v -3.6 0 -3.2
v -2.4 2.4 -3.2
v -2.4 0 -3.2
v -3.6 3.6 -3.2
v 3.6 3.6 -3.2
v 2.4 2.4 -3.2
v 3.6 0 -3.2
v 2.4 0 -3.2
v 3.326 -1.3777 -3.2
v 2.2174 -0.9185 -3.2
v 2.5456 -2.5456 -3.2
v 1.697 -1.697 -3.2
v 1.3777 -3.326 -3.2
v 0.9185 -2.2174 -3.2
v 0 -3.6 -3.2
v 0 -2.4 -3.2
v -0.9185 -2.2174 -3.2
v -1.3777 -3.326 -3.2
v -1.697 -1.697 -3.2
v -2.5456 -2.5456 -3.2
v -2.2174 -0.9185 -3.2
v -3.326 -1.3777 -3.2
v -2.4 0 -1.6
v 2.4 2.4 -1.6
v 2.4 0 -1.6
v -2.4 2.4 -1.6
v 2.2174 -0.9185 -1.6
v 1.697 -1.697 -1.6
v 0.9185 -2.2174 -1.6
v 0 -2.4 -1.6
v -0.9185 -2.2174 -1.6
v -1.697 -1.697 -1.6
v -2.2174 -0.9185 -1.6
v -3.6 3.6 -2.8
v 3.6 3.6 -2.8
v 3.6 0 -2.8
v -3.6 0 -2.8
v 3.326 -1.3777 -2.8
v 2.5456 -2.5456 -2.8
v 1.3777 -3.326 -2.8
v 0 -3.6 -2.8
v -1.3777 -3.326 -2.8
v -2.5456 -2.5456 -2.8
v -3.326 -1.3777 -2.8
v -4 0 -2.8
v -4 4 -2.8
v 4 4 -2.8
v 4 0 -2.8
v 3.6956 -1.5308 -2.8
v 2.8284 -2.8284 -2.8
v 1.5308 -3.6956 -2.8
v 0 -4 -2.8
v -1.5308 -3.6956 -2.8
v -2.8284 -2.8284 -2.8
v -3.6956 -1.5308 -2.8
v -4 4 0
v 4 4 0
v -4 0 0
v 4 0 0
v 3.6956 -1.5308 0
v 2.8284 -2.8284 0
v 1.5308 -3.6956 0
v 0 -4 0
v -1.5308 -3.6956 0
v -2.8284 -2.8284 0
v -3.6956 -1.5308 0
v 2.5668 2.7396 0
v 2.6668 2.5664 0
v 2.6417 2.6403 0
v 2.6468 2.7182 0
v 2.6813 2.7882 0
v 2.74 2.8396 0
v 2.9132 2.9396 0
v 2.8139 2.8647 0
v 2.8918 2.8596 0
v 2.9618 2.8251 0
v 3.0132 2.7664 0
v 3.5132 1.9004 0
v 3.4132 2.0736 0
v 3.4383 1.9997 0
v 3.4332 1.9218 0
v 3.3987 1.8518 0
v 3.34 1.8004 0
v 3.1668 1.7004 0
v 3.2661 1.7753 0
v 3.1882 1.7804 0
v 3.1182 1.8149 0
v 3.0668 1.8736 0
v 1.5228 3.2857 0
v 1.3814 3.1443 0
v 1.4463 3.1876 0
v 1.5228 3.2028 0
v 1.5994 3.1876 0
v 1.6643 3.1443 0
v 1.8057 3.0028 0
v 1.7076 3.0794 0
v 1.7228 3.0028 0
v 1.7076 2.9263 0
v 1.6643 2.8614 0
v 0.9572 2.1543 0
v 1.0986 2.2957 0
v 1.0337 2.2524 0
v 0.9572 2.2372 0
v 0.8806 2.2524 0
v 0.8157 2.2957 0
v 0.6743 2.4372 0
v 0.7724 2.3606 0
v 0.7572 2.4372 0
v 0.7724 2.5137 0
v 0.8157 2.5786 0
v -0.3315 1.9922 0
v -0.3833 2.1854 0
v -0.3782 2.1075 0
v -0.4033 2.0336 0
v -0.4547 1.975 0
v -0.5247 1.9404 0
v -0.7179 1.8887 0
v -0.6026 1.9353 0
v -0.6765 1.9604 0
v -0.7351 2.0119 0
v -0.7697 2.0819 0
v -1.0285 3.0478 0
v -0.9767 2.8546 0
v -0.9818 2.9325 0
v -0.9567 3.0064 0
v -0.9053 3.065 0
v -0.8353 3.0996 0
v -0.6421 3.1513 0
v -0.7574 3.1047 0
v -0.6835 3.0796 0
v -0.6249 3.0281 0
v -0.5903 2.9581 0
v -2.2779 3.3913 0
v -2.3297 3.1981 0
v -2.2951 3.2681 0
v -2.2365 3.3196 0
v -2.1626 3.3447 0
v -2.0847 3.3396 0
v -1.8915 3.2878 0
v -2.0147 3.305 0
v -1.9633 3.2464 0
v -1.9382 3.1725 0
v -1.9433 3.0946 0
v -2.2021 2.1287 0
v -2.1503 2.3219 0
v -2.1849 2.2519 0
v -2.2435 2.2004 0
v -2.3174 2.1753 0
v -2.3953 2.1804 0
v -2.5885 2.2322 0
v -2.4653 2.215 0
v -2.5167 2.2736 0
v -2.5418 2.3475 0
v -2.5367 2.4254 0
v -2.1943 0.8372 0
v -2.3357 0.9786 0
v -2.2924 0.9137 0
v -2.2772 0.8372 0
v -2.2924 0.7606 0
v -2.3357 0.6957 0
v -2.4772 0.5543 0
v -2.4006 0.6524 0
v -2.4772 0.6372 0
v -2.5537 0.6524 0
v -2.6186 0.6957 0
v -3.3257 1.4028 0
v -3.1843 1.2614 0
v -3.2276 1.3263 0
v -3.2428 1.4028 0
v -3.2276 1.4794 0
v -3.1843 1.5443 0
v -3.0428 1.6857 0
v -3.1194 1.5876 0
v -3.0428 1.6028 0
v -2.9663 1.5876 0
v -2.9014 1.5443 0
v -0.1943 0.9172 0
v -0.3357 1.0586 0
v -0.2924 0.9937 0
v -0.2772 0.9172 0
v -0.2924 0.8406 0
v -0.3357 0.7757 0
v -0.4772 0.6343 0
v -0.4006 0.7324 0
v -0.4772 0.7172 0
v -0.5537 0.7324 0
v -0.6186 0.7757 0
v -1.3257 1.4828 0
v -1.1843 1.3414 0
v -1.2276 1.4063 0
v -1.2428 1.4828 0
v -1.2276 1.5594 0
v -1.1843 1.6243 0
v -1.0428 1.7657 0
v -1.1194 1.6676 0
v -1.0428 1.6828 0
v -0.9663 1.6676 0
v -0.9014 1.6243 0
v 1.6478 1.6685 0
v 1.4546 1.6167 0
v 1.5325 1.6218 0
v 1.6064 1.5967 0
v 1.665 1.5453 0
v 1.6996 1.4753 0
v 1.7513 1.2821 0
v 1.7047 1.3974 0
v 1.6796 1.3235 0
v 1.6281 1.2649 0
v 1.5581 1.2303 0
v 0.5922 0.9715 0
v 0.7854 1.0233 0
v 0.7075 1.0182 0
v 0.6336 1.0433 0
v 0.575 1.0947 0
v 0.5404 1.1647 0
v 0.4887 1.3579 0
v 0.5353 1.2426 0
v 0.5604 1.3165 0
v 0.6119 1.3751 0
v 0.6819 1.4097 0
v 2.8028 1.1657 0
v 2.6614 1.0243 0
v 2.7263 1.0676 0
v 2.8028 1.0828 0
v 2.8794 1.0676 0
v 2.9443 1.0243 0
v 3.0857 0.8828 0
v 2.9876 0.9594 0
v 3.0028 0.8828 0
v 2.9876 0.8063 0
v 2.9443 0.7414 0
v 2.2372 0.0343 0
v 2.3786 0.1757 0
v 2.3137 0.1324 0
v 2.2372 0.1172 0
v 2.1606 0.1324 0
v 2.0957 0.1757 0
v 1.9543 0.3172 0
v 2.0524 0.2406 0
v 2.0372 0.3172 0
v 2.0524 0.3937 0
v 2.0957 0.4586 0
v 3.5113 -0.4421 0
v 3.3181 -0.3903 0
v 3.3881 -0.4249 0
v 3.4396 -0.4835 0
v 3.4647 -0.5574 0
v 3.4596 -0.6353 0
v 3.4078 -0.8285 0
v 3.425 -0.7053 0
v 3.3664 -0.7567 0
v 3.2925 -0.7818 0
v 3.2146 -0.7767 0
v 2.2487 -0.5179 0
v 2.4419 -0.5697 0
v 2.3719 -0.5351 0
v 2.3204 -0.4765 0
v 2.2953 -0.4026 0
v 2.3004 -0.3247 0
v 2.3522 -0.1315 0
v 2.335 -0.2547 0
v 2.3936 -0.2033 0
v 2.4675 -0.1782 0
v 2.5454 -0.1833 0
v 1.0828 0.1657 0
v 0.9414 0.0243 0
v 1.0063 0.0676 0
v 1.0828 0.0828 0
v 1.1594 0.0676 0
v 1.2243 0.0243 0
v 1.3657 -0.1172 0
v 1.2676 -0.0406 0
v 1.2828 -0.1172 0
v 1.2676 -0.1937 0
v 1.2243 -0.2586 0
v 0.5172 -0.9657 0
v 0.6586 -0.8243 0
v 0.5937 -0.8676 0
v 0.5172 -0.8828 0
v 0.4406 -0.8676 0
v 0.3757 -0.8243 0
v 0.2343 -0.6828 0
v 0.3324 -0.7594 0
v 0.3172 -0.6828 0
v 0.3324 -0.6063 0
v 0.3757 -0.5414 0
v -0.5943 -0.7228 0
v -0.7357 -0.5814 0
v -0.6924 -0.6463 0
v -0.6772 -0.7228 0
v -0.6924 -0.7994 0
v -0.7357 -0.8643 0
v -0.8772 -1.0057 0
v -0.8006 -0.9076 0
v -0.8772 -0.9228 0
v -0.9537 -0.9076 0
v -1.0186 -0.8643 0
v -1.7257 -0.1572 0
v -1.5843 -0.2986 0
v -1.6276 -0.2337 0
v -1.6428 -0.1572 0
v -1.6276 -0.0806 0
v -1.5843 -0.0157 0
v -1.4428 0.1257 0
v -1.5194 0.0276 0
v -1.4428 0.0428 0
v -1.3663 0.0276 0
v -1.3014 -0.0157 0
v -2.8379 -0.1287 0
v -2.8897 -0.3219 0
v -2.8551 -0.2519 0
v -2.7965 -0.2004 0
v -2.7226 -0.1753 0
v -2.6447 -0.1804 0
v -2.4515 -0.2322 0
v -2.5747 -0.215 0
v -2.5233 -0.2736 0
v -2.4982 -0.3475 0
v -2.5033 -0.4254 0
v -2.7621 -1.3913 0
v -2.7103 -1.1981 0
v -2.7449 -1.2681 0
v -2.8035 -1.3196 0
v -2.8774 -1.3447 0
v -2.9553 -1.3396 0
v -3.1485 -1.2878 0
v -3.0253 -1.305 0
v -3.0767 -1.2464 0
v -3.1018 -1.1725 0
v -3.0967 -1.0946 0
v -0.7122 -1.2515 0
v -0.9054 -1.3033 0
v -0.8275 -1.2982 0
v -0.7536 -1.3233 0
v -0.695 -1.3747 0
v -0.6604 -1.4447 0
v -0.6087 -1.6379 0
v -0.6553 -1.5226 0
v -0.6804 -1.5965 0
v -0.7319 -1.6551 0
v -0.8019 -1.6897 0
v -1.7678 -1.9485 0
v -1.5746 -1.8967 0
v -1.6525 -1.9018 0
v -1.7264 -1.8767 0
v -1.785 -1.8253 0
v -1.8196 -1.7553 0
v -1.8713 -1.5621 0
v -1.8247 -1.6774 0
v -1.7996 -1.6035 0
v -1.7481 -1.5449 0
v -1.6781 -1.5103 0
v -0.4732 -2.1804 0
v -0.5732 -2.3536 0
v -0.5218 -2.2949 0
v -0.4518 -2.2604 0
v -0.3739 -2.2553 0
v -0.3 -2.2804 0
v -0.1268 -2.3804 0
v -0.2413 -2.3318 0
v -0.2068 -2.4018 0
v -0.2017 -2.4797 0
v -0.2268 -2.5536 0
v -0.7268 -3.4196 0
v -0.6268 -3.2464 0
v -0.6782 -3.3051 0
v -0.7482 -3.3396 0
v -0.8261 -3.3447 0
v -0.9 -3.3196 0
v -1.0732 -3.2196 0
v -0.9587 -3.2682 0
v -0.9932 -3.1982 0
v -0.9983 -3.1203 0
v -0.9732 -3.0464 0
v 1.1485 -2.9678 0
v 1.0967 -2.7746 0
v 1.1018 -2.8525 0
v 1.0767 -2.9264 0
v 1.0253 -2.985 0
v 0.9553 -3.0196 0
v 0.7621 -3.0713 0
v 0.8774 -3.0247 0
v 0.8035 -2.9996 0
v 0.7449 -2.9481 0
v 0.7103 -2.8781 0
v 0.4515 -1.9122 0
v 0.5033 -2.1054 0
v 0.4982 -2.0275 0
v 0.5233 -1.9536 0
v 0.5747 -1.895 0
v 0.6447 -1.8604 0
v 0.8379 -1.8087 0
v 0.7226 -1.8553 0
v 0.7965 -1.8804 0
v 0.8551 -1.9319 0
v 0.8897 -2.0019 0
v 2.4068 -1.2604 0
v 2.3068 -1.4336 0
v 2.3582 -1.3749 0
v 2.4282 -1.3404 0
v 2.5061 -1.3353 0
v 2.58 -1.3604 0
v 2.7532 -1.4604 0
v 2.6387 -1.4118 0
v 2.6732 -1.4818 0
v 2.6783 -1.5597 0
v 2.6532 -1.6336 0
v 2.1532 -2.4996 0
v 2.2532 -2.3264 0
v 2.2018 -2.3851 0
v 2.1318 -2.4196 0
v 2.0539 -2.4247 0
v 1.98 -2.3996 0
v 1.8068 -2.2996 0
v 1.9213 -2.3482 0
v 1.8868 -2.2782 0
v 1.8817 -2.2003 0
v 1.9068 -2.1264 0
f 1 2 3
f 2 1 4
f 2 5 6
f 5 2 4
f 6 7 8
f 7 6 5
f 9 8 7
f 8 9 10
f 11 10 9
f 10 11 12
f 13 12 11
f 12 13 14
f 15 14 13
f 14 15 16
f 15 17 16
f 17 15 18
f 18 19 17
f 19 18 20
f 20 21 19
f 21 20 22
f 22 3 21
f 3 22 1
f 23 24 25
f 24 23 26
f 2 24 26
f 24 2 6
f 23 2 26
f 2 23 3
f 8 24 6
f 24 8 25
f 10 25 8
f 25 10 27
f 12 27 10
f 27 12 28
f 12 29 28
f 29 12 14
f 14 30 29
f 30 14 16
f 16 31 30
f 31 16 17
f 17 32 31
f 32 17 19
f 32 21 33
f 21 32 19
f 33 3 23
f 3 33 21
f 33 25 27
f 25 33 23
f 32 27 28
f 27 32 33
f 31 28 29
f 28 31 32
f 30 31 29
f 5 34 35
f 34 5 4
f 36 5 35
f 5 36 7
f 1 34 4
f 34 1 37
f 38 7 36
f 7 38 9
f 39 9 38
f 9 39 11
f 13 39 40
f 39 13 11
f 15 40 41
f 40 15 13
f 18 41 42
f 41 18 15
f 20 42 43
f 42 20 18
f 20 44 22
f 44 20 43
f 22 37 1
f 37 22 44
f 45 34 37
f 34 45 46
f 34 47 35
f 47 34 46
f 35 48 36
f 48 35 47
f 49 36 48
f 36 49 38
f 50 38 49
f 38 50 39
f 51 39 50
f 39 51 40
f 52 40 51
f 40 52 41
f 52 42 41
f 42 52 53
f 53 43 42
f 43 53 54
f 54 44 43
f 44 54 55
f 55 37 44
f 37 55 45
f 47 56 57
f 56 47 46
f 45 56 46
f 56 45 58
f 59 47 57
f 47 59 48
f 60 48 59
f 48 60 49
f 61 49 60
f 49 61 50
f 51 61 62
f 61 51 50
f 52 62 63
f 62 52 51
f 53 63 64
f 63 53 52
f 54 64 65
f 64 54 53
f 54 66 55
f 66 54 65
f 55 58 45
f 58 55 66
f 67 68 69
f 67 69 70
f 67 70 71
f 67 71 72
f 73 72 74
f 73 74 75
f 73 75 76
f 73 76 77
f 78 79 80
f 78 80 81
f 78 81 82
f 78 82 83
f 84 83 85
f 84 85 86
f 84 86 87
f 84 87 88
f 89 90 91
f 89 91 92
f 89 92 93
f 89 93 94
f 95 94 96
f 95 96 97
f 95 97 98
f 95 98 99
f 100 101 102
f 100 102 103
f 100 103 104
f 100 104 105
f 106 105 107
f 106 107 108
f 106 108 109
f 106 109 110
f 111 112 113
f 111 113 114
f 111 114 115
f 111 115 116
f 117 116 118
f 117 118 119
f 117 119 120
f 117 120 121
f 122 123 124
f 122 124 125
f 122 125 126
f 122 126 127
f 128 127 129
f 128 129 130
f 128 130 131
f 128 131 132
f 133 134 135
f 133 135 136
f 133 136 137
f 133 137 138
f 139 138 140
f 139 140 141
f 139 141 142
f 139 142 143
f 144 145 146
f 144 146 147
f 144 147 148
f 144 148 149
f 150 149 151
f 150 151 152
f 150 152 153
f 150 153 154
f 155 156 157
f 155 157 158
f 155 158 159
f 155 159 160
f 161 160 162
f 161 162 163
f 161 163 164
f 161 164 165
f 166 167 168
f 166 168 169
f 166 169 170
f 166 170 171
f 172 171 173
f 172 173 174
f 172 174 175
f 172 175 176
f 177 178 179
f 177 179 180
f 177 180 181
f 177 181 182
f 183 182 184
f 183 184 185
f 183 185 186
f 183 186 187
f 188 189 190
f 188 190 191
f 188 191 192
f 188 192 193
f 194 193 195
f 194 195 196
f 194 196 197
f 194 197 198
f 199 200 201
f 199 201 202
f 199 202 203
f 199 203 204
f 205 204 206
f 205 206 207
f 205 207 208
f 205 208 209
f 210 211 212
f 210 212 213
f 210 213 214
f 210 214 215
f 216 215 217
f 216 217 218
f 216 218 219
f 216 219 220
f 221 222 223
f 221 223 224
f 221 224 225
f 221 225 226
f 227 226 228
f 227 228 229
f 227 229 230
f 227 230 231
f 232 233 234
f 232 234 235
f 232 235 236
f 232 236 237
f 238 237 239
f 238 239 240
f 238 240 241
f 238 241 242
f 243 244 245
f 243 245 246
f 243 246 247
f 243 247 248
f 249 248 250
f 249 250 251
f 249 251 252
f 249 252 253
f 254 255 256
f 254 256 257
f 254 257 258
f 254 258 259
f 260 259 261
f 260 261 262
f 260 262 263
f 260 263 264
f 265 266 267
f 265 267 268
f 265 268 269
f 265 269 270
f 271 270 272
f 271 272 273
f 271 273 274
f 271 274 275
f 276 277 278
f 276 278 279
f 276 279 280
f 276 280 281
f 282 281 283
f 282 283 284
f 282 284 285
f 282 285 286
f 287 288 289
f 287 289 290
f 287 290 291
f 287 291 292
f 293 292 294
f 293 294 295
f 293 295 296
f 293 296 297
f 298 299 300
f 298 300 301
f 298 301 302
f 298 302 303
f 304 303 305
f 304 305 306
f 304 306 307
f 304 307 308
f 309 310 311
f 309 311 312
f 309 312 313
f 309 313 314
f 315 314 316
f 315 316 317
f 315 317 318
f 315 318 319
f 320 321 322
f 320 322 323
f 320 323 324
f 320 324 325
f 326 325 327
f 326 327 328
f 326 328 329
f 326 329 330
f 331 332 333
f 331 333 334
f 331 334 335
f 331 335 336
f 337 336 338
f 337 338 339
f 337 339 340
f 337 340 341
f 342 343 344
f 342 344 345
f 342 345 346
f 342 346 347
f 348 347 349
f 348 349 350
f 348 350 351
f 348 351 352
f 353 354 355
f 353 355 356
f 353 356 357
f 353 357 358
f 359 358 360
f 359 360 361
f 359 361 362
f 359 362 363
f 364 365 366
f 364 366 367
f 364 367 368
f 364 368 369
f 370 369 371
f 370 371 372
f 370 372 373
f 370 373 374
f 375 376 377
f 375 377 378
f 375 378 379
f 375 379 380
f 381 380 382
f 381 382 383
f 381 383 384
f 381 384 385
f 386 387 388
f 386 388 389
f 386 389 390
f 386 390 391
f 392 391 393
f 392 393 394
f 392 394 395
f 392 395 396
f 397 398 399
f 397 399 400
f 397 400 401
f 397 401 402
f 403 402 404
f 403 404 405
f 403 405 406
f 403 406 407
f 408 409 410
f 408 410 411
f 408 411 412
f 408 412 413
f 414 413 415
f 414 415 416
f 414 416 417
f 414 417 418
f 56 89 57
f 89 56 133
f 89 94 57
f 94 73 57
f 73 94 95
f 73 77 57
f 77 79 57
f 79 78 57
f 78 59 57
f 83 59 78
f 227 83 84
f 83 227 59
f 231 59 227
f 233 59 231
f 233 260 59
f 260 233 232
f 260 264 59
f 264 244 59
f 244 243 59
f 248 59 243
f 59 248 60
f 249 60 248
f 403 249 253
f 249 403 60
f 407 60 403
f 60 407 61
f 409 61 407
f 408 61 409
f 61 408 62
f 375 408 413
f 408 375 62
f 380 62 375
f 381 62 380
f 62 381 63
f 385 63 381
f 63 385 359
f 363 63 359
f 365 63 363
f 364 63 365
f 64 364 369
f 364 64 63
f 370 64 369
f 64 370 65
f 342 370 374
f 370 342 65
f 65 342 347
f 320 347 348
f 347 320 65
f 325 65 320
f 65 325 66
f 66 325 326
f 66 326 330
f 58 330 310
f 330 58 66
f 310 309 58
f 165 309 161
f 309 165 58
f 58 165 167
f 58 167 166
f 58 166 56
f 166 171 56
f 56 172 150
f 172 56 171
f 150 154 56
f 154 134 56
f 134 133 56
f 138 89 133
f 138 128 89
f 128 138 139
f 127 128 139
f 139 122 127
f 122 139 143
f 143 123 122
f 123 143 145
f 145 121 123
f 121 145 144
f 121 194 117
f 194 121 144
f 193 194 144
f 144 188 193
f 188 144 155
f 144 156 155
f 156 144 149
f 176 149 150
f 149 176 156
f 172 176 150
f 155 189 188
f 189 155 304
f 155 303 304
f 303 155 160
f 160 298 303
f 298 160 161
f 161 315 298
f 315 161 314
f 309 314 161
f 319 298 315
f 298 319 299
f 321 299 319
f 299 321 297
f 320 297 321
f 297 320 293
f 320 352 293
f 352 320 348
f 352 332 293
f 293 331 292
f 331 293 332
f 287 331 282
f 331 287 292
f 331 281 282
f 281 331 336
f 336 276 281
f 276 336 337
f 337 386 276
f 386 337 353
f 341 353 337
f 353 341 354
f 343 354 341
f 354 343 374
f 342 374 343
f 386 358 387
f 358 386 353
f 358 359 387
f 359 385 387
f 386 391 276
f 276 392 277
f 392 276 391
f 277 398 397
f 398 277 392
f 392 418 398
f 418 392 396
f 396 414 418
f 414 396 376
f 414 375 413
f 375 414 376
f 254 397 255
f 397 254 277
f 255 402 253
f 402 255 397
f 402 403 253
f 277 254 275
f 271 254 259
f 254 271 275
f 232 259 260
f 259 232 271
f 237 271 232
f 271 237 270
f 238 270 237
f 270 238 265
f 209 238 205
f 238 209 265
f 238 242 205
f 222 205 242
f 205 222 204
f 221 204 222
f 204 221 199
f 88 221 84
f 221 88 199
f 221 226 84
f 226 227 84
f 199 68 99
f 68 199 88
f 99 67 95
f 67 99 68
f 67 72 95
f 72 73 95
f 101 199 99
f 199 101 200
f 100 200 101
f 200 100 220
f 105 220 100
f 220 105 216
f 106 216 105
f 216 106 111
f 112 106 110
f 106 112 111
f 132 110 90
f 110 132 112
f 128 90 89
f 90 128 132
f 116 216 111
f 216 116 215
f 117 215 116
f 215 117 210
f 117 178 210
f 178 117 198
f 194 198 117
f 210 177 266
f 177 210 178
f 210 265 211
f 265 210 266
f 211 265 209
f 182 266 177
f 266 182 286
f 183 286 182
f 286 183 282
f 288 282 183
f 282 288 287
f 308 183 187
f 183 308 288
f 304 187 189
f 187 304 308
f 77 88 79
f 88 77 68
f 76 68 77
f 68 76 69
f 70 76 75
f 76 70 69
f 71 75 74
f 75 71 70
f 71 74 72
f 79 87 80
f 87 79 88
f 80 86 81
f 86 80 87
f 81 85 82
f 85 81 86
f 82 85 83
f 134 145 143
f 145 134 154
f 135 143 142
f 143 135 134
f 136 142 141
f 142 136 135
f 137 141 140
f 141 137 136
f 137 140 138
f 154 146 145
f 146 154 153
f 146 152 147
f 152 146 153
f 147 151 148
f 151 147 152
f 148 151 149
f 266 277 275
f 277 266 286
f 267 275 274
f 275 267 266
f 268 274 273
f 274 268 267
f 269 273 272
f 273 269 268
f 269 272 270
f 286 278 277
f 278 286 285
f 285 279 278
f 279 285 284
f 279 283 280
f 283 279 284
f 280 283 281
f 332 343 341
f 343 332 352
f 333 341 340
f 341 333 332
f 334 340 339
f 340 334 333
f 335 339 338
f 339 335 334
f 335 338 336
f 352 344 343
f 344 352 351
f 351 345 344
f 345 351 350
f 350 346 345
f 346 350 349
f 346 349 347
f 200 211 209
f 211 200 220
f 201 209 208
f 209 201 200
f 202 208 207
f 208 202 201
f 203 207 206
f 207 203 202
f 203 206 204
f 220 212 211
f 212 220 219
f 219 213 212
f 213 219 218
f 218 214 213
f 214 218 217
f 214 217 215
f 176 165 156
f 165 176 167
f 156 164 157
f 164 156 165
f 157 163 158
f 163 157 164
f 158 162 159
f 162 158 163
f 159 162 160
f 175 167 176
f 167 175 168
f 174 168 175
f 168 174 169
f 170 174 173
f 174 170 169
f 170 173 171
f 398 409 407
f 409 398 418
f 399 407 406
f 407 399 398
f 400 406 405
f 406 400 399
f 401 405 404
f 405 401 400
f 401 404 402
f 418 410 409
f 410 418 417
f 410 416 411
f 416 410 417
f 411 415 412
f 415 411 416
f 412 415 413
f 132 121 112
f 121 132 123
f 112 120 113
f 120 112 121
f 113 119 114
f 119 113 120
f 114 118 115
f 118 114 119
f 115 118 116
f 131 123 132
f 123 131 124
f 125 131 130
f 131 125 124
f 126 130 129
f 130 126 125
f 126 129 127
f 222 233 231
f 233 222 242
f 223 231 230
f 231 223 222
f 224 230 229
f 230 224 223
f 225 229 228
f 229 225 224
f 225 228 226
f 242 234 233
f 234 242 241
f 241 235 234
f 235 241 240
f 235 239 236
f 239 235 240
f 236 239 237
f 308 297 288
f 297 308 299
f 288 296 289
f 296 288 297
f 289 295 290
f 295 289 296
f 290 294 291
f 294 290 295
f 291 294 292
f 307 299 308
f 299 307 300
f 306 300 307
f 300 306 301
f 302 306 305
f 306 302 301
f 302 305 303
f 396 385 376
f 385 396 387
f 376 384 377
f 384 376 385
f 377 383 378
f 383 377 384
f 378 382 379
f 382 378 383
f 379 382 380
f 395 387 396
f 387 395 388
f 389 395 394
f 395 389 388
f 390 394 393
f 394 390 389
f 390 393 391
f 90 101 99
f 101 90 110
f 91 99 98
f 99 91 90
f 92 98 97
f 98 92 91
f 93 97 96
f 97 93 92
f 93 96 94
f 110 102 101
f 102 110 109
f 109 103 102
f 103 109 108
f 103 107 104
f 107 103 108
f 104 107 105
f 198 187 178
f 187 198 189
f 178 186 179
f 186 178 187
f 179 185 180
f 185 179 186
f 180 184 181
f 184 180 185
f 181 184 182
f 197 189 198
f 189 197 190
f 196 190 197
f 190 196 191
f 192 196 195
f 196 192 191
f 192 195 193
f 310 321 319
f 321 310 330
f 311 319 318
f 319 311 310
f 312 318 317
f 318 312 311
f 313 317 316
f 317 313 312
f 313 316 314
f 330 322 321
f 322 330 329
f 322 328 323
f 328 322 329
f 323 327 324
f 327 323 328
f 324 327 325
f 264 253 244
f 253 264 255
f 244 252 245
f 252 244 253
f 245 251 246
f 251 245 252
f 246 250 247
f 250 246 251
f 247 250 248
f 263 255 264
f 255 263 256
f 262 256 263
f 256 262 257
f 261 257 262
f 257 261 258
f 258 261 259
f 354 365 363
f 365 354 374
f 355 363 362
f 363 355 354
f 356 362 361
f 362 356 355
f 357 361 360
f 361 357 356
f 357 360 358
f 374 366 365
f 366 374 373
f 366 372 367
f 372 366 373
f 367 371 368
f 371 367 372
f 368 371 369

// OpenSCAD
use <../lib.scad>
use <s/24246p0as03.scad>
use <s/24246p0as04.scad>
use <s/24246p0as05.scad>
use <s/24246p0as06.scad>
use <s/24246p0as07.scad>
use <s/24246s02.scad>
function ldraw_lib__24246p0b() = [
// 0 Tile  1 x  1 with Rounded End with Coral, Light Aqua, Magenta and Yellow Sprinkles Pattern
// 0 Name: 24246p0b.dat
// 0 Author: Takeshi Takahashi [RainbowDolphin]
// 0 !LDRAW_ORG Part UPDATE 2025-08
// 0 !LICENSE Licensed under CC BY 4.0 : see CAreadme.txt
// 
// 0 BFC CERTIFY CCW
  [0,"BFC","CERTIFY"],
  [0,"BFC","CCW"],
// 
// 0 !KEYWORDS bracelet, Bricklink 24246pb011, Dots, Ice cream
// 0 !KEYWORDS Rebrickable 24246pr0006, Set 41910
// 
// 0 !HISTORY 2025-08-31 [OrionP] Official Update 2025-08
// 
// 
// 1 16 0 0 0 1 0 0 0 1 0 0 0 1 s\24246s02.dat
  [1,16,0,0,0,1,0,0,0,1,0,0,0,1, ldraw_lib__s__24246s02()],
// 1 16 0 0 0 -1 0 0 0 1 0 0 0 1 s\24246p0as03.dat
  [1,16,0,0,0,-1,0,0,0,1,0,0,0,1, ldraw_lib__s__24246p0as03()],
// 1 323 0 0 0 -1 0 0 0 1 0 0 0 1 s\24246p0as04.dat
  [1,323,0,0,0,-1,0,0,0,1,0,0,0,1, ldraw_lib__s__24246p0as04()],
// 1 26 0 0 0 -1 0 0 0 1 0 0 0 1 s\24246p0as05.dat
  [1,26,0,0,0,-1,0,0,0,1,0,0,0,1, ldraw_lib__s__24246p0as05()],
// 1 353 0 0 0 -1 0 0 0 1 0 0 0 1 s\24246p0as06.dat
  [1,353,0,0,0,-1,0,0,0,1,0,0,0,1, ldraw_lib__s__24246p0as06()],
// 1 14 0 0 0 -1 0 0 0 1 0 0 0 1 s\24246p0as07.dat
  [1,14,0,0,0,-1,0,0,0,1,0,0,0,1, ldraw_lib__s__24246p0as07()],
];
module ldraw_lib__24246p0b(step=0, col=false, unit=2/5, alt=false, line=0.2, solid=!$preview)
    makepoly(ldraw_lib__24246p0b(), step=step, col=col, unit=unit, alt=alt, line=line, solid=solid);
ldraw_lib__24246p0b(line=0.2);
